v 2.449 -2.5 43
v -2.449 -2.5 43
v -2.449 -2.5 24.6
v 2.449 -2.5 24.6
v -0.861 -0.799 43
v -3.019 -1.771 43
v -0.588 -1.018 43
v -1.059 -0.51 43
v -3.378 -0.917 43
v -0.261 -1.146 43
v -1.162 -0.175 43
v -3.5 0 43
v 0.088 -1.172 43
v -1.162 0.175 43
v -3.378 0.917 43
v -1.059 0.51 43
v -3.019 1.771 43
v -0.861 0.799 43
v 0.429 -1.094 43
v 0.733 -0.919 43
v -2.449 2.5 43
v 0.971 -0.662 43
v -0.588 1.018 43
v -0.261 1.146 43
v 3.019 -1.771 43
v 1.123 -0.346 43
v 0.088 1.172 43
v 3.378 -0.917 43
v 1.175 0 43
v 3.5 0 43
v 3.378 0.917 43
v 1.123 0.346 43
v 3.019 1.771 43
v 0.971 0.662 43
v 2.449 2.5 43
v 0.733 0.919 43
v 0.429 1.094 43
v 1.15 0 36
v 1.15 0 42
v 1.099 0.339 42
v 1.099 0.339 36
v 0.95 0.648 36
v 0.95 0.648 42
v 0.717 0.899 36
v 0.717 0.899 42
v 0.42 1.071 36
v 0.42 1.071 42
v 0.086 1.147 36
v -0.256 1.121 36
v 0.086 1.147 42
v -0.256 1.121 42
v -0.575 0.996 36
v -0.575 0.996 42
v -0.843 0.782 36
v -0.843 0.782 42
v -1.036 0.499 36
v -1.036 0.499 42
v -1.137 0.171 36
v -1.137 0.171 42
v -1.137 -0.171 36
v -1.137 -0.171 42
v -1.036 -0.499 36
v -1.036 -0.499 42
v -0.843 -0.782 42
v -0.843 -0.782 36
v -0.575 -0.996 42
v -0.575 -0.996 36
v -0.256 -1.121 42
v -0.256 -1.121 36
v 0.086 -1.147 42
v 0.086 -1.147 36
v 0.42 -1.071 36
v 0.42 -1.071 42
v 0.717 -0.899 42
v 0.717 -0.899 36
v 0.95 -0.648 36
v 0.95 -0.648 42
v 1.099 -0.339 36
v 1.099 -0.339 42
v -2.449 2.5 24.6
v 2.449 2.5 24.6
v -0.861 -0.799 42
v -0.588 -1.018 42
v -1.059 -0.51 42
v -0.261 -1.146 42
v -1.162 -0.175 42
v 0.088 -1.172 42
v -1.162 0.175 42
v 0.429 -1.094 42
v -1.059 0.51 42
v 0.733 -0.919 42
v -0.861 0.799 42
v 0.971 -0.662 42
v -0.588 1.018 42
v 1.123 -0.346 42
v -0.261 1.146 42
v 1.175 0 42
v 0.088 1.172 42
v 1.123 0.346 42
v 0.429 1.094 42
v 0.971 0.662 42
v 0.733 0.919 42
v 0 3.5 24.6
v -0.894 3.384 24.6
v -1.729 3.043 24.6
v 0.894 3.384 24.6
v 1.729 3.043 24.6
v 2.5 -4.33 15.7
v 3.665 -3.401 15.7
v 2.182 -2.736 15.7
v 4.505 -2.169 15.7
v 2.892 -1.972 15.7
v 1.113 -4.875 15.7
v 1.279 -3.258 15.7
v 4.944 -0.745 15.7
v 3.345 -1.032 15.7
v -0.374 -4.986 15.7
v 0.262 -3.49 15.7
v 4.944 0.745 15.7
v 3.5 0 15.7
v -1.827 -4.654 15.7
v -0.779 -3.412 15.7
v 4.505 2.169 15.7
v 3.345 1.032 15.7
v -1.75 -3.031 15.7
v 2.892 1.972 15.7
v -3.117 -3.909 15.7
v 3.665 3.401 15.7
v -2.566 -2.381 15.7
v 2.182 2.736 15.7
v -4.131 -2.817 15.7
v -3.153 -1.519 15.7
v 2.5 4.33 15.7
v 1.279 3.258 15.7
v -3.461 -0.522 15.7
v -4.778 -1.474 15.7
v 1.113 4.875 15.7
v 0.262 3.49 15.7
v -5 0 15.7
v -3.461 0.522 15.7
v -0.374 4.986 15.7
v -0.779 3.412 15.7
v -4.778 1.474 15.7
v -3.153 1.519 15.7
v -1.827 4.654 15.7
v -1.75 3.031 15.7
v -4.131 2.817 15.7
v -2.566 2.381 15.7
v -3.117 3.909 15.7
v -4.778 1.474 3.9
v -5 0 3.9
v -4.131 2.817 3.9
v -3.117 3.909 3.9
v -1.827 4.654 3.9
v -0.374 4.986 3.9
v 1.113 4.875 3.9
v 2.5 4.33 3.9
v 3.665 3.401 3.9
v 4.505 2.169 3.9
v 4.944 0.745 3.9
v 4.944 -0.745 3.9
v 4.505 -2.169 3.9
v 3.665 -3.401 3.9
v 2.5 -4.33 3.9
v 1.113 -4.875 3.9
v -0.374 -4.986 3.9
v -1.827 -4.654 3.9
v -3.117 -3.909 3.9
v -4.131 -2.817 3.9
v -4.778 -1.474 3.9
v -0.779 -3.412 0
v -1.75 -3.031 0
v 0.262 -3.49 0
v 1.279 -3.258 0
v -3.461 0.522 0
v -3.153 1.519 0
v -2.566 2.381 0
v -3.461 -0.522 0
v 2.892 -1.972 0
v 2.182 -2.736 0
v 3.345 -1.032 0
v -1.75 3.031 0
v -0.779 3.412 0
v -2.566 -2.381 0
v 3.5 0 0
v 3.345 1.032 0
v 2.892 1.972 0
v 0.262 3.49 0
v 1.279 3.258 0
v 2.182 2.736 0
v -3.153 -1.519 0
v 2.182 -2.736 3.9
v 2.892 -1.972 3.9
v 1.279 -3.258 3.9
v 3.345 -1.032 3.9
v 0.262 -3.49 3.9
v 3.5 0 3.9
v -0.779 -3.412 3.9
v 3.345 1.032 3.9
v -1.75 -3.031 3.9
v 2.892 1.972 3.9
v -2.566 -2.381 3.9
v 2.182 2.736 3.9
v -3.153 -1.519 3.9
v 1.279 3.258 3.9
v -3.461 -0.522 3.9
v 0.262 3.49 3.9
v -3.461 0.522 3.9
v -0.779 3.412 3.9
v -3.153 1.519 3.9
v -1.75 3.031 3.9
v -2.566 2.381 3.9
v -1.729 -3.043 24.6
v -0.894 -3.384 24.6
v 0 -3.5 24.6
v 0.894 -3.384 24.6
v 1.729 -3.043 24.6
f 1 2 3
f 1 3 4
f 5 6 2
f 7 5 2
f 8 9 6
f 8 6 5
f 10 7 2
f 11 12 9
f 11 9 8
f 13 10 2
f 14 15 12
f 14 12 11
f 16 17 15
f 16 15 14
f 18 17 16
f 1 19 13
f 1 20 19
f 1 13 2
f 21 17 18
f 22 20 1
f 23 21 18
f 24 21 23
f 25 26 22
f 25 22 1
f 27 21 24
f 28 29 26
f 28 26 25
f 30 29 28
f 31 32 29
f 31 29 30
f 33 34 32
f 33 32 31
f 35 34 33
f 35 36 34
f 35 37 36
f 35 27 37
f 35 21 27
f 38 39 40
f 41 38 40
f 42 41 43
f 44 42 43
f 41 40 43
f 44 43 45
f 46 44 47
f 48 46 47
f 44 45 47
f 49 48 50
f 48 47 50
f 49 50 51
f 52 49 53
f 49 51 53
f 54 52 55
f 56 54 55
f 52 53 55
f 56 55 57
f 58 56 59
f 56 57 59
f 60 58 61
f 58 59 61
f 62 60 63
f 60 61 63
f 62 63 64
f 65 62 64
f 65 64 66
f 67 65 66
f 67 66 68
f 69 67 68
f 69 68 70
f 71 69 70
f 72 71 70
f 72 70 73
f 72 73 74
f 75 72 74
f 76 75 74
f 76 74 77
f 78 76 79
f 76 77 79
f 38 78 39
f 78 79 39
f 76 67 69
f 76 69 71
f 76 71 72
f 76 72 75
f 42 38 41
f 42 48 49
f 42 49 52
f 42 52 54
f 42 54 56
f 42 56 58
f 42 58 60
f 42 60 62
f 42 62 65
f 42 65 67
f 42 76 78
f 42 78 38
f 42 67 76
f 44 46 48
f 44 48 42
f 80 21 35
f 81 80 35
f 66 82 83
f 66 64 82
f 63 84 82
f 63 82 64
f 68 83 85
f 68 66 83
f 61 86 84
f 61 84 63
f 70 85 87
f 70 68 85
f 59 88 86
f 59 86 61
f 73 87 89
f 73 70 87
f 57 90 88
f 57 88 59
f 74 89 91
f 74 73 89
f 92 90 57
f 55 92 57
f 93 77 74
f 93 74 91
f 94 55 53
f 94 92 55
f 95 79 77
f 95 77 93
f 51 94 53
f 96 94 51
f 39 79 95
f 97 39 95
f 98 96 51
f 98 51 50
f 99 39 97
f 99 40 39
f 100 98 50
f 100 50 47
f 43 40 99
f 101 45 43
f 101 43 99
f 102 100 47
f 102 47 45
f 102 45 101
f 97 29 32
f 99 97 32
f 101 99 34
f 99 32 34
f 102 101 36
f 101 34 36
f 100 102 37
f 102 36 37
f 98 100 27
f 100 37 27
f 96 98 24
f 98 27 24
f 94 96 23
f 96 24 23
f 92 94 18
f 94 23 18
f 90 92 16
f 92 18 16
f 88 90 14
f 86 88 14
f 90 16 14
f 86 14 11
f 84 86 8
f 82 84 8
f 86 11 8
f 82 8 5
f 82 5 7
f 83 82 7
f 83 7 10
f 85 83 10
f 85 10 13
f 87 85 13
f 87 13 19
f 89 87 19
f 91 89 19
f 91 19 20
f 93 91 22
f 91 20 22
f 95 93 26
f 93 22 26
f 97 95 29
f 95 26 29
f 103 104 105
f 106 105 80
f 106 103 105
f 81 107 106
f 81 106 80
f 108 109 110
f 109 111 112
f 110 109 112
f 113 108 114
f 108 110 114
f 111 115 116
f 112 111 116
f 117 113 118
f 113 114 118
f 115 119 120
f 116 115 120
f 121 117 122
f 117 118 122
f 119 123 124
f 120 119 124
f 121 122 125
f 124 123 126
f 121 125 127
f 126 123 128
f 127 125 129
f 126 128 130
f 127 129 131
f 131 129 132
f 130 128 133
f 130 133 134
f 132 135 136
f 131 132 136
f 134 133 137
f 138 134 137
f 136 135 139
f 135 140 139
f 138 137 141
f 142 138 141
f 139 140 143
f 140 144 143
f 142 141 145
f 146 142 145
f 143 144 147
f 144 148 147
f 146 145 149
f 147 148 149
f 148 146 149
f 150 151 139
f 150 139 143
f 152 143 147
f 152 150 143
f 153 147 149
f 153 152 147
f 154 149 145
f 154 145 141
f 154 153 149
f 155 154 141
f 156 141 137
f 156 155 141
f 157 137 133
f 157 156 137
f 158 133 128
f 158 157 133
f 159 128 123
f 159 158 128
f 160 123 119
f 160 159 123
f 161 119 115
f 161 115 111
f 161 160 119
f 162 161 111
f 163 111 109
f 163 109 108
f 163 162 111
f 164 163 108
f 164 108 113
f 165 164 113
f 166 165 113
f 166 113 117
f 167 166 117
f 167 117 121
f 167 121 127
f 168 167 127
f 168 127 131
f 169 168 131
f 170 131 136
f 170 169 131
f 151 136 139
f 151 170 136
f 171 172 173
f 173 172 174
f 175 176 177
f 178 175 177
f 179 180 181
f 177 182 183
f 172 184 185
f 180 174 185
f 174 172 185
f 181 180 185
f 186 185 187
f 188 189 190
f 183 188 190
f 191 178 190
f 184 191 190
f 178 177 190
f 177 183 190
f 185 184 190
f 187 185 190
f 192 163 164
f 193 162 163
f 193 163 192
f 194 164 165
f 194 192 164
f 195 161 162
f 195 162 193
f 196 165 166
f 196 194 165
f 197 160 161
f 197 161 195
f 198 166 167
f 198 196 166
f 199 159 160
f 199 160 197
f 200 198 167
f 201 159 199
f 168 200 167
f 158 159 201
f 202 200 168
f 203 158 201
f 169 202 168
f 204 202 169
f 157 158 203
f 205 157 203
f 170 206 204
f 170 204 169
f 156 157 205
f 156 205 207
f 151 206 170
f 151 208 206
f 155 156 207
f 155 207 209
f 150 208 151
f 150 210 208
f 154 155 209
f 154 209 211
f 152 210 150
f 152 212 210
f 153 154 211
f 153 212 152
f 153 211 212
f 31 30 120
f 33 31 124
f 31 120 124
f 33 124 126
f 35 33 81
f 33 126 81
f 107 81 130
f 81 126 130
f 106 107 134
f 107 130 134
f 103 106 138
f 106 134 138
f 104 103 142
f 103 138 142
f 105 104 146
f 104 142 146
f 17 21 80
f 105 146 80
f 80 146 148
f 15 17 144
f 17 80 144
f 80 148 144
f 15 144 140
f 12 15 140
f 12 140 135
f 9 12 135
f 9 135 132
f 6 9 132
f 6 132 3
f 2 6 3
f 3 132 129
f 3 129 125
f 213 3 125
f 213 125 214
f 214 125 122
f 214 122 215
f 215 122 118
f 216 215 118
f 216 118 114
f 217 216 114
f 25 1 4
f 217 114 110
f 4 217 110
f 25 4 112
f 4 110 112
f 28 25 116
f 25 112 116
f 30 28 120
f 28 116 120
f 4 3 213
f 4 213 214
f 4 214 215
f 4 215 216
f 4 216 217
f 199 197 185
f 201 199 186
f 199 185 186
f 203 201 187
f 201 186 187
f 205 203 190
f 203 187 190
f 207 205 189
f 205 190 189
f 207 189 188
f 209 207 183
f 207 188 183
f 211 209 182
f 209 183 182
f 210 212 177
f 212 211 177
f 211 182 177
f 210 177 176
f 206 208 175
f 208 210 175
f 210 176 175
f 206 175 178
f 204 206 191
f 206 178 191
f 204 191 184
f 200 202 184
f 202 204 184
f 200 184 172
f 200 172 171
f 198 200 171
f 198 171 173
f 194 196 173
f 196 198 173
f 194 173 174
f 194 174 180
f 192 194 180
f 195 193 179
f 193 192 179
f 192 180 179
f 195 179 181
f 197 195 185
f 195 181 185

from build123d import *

# Parameters (mm, degrees)
SKETCH_1_R           = 3.5
EXTRUDE_1_DEPTH      = 43
SKETCH_2_OUTSIDE_W   = 17.824
SKETCH_2_OUTSIDE_H   = 17.824
SKETCH_2_OUTSIDE_W_2 = 10.593795304
SKETCH_2_OUTSIDE_H_2 = 5
CUT_EXTRUDE_1_DEPTH  = 18.4
EXTRUDE_START        = -3.9
SKETCH_5_R           = 5
EXTRUDE_2_DEPTH      = 11.8
SKETCH_3_R           = 1.175
CUT_EXTRUDE_2_DEPTH  = 1
SKETCH_6_R           = 1.15
CUT_EXTRUDE_3_DEPTH  = 6


with BuildPart() as part:
    # 草图1 → 凸台-拉伸1 (new body)
    with BuildSketch(Plane.XY):
        Circle(SKETCH_1_R)
    extrude(amount=EXTRUDE_1_DEPTH)

    # 草图2 outside → 切除-拉伸1 (cut)
    with BuildSketch(Plane.XY.offset(43)):
        Rectangle(SKETCH_2_OUTSIDE_W, SKETCH_2_OUTSIDE_H)
        Rectangle(SKETCH_2_OUTSIDE_W_2, SKETCH_2_OUTSIDE_H_2, mode=Mode.SUBTRACT)
    extrude(amount=-CUT_EXTRUDE_1_DEPTH, mode=Mode.SUBTRACT)

    # 草图5 → 凸台-拉伸2 (add)
    with BuildSketch(Plane(origin=(0, 0, 0), x_dir=(-1, 0, 0), z_dir=(0, 0, -1)).offset(EXTRUDE_START)):
        Circle(SKETCH_5_R)
    extrude(amount=-EXTRUDE_2_DEPTH)

    # 草图3 → 切除-拉伸2 (cut)
    with BuildSketch(Plane.XY.offset(43)):
        Circle(SKETCH_3_R)
    extrude(amount=-CUT_EXTRUDE_2_DEPTH, mode=Mode.SUBTRACT)

    # 草图6 → 切除-拉伸3 (cut)
    with BuildSketch(Plane.XY.offset(42)):
        Circle(SKETCH_6_R)
    extrude(amount=-CUT_EXTRUDE_3_DEPTH, mode=Mode.SUBTRACT)


solid = part.part
